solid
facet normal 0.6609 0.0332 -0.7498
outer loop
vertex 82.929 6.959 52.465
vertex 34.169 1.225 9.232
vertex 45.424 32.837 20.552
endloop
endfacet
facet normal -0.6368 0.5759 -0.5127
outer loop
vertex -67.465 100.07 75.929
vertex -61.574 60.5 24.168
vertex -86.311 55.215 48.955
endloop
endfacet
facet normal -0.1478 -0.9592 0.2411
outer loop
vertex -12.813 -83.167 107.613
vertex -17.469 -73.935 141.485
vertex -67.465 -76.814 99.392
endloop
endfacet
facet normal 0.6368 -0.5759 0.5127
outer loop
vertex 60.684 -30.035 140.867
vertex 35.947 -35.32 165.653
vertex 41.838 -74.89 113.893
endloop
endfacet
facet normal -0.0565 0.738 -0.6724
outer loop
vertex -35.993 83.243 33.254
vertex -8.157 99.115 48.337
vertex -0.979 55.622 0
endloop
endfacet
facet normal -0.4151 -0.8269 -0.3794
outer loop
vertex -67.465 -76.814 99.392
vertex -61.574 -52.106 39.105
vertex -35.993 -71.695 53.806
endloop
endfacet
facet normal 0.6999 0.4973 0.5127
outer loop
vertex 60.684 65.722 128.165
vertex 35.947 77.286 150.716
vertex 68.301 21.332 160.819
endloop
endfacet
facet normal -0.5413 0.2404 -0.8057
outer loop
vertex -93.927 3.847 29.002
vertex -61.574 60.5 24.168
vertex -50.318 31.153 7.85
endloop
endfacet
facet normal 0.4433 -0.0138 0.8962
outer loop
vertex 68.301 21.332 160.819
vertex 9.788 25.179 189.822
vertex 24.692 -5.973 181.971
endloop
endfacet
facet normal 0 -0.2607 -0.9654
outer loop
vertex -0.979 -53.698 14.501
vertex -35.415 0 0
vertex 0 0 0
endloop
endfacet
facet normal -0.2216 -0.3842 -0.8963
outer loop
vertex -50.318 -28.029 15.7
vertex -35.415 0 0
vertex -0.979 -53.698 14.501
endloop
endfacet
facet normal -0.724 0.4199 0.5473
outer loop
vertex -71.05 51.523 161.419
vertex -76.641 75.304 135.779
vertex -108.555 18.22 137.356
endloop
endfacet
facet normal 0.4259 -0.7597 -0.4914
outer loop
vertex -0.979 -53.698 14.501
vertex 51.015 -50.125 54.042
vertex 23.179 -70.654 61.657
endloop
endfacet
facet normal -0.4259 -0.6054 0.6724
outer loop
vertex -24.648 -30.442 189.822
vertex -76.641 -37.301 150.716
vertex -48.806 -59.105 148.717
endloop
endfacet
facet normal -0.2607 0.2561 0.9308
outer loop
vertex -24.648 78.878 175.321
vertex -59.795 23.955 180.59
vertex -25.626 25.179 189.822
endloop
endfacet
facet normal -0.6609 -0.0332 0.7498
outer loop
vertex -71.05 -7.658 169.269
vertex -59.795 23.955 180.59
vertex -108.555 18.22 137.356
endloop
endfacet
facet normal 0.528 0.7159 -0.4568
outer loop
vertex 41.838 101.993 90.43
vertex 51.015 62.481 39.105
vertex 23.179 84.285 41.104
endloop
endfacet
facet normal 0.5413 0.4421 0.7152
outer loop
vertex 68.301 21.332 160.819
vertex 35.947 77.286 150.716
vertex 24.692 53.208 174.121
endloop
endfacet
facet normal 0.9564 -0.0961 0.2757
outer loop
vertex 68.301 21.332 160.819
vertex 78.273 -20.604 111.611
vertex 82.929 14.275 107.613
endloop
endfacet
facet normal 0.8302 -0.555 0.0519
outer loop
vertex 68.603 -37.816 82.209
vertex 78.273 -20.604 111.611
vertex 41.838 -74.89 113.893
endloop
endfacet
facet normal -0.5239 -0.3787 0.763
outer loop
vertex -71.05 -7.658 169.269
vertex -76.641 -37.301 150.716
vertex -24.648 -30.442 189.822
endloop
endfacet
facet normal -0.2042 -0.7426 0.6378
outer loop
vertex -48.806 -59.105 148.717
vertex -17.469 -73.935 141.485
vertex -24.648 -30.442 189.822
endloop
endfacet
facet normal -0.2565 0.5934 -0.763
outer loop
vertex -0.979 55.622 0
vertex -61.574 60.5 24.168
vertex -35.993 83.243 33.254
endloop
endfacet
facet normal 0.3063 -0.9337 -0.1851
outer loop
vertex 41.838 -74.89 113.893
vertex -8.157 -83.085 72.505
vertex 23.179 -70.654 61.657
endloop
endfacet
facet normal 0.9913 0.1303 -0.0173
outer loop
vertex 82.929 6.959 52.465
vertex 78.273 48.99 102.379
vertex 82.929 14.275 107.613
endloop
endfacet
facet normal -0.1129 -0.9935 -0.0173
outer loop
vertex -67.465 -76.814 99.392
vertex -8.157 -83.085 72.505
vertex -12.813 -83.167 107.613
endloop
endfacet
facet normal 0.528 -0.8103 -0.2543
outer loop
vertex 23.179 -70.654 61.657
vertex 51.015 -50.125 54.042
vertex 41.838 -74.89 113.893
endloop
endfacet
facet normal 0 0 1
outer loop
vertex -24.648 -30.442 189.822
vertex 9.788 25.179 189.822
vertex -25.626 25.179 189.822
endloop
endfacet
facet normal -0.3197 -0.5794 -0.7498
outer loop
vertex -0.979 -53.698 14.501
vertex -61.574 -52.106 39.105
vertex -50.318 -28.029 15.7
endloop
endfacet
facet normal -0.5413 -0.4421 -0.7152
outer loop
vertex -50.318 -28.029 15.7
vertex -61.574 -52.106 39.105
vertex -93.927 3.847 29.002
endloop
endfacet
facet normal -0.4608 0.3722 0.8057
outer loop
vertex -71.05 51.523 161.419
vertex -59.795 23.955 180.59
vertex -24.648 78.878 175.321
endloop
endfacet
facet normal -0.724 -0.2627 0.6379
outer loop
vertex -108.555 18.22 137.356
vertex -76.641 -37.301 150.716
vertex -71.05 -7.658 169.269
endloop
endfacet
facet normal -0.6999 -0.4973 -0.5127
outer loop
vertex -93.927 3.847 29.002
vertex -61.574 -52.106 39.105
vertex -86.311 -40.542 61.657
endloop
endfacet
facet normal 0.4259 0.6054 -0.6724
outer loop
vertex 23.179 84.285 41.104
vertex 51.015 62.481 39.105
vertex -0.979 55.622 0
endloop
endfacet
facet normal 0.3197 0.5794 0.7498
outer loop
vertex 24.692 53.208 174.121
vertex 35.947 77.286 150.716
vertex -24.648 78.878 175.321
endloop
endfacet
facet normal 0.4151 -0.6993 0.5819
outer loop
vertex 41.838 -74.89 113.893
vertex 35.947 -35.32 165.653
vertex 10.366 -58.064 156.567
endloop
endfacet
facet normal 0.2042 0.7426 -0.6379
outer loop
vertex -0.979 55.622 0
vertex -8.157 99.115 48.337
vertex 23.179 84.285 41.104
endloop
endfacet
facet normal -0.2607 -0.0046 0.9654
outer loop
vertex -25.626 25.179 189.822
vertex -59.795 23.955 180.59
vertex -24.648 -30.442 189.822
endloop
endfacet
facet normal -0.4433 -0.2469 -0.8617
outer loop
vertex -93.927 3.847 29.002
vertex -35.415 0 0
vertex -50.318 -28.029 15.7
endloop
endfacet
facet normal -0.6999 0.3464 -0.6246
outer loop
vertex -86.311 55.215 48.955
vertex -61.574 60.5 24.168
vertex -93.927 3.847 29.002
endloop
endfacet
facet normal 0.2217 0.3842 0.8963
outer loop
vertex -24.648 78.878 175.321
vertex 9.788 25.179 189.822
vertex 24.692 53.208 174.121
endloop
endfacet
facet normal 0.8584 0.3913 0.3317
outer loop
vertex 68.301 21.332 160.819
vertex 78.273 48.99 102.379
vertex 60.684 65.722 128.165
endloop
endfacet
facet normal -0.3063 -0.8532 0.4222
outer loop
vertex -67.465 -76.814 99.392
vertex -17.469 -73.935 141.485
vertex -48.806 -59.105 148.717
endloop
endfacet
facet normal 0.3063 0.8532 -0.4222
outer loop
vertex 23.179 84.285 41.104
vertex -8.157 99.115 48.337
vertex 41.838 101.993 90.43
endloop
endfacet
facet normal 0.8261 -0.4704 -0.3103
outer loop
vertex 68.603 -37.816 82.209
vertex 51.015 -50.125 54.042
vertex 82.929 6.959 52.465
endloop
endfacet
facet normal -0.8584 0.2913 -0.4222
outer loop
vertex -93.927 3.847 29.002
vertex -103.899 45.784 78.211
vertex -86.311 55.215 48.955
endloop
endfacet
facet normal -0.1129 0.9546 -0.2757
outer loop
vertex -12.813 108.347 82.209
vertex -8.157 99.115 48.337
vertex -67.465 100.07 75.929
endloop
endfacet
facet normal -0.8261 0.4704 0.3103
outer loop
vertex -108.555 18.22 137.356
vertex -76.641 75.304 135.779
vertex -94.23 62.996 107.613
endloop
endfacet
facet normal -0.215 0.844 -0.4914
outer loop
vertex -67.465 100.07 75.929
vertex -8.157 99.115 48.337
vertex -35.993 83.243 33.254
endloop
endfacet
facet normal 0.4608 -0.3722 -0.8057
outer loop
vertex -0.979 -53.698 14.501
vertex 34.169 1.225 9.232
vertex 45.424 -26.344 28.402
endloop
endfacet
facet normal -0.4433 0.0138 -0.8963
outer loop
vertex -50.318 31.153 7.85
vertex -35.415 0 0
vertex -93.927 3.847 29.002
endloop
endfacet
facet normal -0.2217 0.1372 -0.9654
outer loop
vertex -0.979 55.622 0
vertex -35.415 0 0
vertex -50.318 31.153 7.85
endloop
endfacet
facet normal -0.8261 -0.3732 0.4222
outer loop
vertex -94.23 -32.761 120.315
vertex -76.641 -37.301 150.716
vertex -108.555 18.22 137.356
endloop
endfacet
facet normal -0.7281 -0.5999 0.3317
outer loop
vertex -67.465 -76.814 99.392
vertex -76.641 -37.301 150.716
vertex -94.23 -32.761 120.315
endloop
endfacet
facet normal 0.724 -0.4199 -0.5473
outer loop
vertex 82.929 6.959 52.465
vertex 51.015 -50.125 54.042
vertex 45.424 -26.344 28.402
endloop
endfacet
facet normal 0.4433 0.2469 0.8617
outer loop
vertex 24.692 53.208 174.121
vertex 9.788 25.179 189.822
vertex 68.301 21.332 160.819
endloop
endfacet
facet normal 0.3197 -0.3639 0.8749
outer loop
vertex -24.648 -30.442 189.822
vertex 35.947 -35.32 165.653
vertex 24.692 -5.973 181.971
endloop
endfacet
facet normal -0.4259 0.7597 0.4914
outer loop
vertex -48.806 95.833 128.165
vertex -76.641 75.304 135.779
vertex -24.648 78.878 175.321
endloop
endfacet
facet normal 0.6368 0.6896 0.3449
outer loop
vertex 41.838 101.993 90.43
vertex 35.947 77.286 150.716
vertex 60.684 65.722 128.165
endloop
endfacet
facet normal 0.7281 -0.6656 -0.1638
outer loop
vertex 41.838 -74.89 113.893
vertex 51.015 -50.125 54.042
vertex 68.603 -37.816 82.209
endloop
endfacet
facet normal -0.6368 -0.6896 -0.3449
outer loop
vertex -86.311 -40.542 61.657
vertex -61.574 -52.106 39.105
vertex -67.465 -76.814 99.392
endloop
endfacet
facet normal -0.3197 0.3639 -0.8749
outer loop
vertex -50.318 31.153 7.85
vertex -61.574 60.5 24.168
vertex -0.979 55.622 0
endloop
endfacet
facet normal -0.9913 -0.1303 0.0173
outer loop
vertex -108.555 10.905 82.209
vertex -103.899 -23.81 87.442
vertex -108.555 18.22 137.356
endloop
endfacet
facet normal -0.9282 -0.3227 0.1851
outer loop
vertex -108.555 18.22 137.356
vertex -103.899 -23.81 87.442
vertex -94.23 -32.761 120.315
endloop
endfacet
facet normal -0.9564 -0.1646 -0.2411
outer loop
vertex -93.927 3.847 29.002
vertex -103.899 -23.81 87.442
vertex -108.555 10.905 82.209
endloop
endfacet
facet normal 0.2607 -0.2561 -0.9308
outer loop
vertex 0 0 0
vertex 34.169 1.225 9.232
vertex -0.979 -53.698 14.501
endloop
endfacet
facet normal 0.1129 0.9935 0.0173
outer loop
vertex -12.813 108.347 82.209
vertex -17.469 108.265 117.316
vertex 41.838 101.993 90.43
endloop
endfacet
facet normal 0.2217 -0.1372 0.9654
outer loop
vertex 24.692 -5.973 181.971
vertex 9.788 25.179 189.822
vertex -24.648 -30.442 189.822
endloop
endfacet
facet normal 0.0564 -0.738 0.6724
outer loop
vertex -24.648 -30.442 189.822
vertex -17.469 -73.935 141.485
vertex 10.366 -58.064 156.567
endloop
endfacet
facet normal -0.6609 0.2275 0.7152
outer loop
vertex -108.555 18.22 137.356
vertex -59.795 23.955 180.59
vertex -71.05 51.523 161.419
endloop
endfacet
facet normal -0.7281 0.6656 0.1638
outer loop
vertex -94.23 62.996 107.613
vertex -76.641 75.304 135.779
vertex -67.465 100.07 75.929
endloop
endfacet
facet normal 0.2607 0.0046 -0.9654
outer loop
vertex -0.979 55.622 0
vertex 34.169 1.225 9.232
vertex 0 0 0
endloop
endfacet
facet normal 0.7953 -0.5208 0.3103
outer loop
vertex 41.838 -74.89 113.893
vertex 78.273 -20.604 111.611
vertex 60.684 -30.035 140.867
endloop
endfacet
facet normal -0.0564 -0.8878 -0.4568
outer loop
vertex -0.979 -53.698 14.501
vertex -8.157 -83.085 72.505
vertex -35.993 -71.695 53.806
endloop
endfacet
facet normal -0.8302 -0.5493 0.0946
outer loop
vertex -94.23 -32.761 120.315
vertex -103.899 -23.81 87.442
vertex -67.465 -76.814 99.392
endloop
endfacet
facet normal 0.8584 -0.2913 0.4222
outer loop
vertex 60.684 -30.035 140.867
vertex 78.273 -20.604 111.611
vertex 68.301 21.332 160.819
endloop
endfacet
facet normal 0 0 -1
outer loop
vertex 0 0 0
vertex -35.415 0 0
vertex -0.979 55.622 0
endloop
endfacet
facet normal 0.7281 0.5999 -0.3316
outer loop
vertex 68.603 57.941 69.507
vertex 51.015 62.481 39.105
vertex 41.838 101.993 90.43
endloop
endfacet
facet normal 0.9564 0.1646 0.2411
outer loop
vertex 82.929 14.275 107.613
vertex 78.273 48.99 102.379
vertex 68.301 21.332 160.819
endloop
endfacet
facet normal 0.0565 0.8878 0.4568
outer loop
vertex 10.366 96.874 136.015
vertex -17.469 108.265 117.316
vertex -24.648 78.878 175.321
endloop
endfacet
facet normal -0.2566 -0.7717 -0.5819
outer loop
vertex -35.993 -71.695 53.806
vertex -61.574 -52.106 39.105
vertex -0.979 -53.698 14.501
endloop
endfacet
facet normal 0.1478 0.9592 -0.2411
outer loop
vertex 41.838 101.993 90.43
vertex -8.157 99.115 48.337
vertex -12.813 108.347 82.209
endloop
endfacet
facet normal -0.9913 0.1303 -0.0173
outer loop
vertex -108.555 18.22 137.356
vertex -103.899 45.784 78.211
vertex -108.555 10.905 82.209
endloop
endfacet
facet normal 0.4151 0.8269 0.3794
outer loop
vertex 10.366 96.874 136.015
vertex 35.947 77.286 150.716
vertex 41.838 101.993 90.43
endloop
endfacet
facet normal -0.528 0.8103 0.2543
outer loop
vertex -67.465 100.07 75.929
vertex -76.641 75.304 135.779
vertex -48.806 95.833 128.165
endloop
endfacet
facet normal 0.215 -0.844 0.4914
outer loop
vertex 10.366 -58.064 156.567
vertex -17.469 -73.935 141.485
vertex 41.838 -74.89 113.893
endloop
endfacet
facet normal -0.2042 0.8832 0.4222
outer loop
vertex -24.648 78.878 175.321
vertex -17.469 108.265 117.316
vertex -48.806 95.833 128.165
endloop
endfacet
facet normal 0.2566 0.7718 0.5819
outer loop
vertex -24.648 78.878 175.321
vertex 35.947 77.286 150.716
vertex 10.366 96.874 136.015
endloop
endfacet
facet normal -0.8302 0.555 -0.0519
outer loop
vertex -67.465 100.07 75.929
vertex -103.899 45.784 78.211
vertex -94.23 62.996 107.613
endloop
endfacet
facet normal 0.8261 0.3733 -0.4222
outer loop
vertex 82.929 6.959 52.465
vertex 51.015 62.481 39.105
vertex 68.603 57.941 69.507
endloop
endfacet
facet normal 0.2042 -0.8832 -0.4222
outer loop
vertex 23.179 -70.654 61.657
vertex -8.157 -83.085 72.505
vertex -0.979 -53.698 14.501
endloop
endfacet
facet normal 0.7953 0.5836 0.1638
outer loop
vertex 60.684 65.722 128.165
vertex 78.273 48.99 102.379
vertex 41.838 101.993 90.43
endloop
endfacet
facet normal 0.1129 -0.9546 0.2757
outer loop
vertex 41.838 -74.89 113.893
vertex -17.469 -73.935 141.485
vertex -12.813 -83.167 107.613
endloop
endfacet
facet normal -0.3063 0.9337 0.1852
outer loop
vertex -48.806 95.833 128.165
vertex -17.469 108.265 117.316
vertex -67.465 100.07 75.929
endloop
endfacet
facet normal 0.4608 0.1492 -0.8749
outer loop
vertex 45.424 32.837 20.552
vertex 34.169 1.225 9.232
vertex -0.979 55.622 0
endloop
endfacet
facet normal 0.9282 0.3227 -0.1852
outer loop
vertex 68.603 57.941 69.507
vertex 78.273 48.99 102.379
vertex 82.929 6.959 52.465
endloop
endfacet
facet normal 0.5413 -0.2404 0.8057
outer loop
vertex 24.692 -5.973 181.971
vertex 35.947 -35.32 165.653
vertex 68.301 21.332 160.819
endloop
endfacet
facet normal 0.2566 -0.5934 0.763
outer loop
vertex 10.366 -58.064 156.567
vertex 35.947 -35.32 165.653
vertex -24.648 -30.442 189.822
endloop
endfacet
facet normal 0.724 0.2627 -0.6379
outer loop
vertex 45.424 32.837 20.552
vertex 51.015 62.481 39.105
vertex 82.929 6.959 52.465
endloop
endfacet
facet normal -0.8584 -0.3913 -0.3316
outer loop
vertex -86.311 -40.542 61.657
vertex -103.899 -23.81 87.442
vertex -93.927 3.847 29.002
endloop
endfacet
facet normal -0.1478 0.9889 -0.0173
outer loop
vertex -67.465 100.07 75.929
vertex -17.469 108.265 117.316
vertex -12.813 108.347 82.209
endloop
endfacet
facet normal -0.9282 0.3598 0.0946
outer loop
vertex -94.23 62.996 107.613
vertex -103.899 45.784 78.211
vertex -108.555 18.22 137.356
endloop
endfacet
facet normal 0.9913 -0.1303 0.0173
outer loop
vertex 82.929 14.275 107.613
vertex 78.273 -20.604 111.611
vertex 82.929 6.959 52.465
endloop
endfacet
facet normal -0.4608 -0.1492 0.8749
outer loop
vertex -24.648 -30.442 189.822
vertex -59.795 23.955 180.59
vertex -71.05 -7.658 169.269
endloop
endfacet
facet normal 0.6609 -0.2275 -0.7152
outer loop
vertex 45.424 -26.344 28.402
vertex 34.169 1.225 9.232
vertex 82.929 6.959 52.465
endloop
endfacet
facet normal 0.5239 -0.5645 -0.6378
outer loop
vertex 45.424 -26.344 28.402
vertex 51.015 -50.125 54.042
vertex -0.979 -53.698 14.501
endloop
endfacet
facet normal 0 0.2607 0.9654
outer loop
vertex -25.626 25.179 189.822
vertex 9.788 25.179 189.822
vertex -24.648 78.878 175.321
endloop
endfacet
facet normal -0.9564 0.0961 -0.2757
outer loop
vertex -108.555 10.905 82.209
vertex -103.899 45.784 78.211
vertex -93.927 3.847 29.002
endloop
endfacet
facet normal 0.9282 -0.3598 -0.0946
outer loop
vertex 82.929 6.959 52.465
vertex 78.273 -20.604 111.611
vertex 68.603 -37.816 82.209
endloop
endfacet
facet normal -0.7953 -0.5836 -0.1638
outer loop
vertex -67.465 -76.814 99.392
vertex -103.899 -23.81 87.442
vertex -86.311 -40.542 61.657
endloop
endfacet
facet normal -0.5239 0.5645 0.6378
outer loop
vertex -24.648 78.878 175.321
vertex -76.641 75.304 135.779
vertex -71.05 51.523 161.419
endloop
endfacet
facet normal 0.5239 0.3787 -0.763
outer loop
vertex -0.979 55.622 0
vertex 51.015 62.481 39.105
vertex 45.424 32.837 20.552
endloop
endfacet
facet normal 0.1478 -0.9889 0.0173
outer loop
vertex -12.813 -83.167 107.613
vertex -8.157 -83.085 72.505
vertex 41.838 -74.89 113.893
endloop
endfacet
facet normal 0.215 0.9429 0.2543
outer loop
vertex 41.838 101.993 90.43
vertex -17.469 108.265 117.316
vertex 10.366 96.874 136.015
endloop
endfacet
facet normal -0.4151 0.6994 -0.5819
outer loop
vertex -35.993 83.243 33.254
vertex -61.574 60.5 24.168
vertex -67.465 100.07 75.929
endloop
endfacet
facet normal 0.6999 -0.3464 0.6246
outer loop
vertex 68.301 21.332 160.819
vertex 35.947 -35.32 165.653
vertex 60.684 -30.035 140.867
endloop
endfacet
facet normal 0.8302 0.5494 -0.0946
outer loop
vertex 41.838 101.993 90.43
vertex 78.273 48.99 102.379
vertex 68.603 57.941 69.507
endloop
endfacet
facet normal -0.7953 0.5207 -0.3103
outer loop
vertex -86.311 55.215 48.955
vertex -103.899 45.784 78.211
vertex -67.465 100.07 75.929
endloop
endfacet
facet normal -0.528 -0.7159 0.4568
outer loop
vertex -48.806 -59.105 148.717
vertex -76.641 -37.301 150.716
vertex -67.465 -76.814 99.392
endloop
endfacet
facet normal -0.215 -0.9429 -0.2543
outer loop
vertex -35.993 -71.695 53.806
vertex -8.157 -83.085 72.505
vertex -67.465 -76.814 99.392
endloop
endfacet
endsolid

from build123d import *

# Parameters (mm, degrees)
F1_DEPTH = 101.6
F1_TAPER = 7.556054046


with BuildPart() as f1:
    # F0 (on Top) → F1 (new body)
    with BuildSketch(Plane.XY):
        Polygon((0, 0), (-0.9788434916, 55.6218195157), (-35.4148902231, 0), align=None)
    extrude(amount=F1_DEPTH, taper=F1_TAPER)

    # F2: F1 across face


with BuildPart() as f1_1:
    add(f1.part)
    add(f1.part.mirror(Plane(origin=(-16.4023206536, 22.737179725, 31.6369417684), x_dir=(-0.5263932023, -0.8502412579, 0), z_dir=(-0.8428583491, 0.5218223667, 0.1314960875))))

    # F3: F1 across face


with BuildPart() as f1_2:
    add(f1_1.part)
    add(f1_1.part.mirror(Plane(origin=(-4.5973572795, 22.7371792838, 31.6369418981), x_dir=(-0.0175954682, 0.9998451878, 0), z_dir=(0.9911632216, 0.0174426813, 0.1314960875))))

    # F4: F1 across face


with BuildPart() as f1_3:
    add(f1_2.part)
    add(f1_2.part.mirror(Plane(origin=(10.5439699338, 33.6829824787, 38.4876798223), x_dir=(-0.9642022, 0.2651680929, 0), z_dir=(0.2399623244, 0.8725491765, 0.425530278))))

    # F5: F1 across face


with BuildPart() as f1_4:
    add(f1_3.part)
    add(f1_3.part.mirror(Plane(origin=(-21.3700903424, 33.1213526999, 34.2536909371), x_dir=(-0.9178751297, -0.3968693062, 0), z_dir=(-0.3726102349, 0.8617690066, 0.3442612266))))

    # F6: F1 across face


with BuildPart() as f1_5:
    add(f1_4.part)
    add(f1_4.part.mirror(Plane(origin=(-16.0760387074, 4.1965743618, 31.6369428308), x_dir=(1, 0, 0), z_dir=(0, -0.9913166895, 0.1314960875))))

    # F7: F1 across face


with BuildPart() as f1_6:
    add(f1_5.part)
    add(f1_5.part.mirror(Plane(origin=(22.2597853072, -4.1764689394, 44.1816075195), x_dir=(-0.5858563278, 0.8104149327, 0), z_dir=(0.7608774319, 0.5500452178, 0.3442612266))))

    # F8: F1 across face


with BuildPart() as f1_7:
    add(f1_6.part)
    add(f1_6.part.mirror(Plane(origin=(35.6016618602, 44.3371609674, 67.8410401107), x_dir=(-0.9178751298, -0.3968693062, 0), z_dir=(-0.3726102349, 0.8617690066, 0.3442612266))))

    # F9: F1 across face


with BuildPart() as f1_8:
    add(f1_7.part)
    add(f1_7.part.mirror(Plane(origin=(-53.5658558506, 42.7679738217, 56.0113238164), x_dir=(0.9642022, -0.265168093, 0), z_dir=(-0.2399623245, -0.8725491764, -0.425530278))))

    # F10: F1 across face


with BuildPart() as f1_9:
    add(f1_8.part)
    add(f1_8.part.mirror(Plane(origin=(-67.6744000884, -17.254319617, 81.3366041914), x_dir=(0.950172763, 0.3117237888, 0), z_dir=(0.2399623244, -0.7314349209, 0.638295417))))

    # F11: F1 across face


with BuildPart() as f1_10:
    add(f1_9.part)
    add(f1_9.part.mirror(Plane(origin=(-47.8862406141, 9.6288854157, 148.2567814243), x_dir=(-0.5016862394, -0.8650496617, 0), z_dir=(-0.7608774318, 0.4412714719, -0.4757573141))))

    # F12: F1 across face


with BuildPart() as f1_11:
    add(f1_10.part)
    add(f1_10.part.mirror(Plane(origin=(11.1666679236, 62.2499398733, 127.2140978003), x_dir=(0.3283942647, -0.9445407386, 0), z_dir=(-0.6028960247, -0.2096125541, 0.7697915046))))


solid = f1_11.part
